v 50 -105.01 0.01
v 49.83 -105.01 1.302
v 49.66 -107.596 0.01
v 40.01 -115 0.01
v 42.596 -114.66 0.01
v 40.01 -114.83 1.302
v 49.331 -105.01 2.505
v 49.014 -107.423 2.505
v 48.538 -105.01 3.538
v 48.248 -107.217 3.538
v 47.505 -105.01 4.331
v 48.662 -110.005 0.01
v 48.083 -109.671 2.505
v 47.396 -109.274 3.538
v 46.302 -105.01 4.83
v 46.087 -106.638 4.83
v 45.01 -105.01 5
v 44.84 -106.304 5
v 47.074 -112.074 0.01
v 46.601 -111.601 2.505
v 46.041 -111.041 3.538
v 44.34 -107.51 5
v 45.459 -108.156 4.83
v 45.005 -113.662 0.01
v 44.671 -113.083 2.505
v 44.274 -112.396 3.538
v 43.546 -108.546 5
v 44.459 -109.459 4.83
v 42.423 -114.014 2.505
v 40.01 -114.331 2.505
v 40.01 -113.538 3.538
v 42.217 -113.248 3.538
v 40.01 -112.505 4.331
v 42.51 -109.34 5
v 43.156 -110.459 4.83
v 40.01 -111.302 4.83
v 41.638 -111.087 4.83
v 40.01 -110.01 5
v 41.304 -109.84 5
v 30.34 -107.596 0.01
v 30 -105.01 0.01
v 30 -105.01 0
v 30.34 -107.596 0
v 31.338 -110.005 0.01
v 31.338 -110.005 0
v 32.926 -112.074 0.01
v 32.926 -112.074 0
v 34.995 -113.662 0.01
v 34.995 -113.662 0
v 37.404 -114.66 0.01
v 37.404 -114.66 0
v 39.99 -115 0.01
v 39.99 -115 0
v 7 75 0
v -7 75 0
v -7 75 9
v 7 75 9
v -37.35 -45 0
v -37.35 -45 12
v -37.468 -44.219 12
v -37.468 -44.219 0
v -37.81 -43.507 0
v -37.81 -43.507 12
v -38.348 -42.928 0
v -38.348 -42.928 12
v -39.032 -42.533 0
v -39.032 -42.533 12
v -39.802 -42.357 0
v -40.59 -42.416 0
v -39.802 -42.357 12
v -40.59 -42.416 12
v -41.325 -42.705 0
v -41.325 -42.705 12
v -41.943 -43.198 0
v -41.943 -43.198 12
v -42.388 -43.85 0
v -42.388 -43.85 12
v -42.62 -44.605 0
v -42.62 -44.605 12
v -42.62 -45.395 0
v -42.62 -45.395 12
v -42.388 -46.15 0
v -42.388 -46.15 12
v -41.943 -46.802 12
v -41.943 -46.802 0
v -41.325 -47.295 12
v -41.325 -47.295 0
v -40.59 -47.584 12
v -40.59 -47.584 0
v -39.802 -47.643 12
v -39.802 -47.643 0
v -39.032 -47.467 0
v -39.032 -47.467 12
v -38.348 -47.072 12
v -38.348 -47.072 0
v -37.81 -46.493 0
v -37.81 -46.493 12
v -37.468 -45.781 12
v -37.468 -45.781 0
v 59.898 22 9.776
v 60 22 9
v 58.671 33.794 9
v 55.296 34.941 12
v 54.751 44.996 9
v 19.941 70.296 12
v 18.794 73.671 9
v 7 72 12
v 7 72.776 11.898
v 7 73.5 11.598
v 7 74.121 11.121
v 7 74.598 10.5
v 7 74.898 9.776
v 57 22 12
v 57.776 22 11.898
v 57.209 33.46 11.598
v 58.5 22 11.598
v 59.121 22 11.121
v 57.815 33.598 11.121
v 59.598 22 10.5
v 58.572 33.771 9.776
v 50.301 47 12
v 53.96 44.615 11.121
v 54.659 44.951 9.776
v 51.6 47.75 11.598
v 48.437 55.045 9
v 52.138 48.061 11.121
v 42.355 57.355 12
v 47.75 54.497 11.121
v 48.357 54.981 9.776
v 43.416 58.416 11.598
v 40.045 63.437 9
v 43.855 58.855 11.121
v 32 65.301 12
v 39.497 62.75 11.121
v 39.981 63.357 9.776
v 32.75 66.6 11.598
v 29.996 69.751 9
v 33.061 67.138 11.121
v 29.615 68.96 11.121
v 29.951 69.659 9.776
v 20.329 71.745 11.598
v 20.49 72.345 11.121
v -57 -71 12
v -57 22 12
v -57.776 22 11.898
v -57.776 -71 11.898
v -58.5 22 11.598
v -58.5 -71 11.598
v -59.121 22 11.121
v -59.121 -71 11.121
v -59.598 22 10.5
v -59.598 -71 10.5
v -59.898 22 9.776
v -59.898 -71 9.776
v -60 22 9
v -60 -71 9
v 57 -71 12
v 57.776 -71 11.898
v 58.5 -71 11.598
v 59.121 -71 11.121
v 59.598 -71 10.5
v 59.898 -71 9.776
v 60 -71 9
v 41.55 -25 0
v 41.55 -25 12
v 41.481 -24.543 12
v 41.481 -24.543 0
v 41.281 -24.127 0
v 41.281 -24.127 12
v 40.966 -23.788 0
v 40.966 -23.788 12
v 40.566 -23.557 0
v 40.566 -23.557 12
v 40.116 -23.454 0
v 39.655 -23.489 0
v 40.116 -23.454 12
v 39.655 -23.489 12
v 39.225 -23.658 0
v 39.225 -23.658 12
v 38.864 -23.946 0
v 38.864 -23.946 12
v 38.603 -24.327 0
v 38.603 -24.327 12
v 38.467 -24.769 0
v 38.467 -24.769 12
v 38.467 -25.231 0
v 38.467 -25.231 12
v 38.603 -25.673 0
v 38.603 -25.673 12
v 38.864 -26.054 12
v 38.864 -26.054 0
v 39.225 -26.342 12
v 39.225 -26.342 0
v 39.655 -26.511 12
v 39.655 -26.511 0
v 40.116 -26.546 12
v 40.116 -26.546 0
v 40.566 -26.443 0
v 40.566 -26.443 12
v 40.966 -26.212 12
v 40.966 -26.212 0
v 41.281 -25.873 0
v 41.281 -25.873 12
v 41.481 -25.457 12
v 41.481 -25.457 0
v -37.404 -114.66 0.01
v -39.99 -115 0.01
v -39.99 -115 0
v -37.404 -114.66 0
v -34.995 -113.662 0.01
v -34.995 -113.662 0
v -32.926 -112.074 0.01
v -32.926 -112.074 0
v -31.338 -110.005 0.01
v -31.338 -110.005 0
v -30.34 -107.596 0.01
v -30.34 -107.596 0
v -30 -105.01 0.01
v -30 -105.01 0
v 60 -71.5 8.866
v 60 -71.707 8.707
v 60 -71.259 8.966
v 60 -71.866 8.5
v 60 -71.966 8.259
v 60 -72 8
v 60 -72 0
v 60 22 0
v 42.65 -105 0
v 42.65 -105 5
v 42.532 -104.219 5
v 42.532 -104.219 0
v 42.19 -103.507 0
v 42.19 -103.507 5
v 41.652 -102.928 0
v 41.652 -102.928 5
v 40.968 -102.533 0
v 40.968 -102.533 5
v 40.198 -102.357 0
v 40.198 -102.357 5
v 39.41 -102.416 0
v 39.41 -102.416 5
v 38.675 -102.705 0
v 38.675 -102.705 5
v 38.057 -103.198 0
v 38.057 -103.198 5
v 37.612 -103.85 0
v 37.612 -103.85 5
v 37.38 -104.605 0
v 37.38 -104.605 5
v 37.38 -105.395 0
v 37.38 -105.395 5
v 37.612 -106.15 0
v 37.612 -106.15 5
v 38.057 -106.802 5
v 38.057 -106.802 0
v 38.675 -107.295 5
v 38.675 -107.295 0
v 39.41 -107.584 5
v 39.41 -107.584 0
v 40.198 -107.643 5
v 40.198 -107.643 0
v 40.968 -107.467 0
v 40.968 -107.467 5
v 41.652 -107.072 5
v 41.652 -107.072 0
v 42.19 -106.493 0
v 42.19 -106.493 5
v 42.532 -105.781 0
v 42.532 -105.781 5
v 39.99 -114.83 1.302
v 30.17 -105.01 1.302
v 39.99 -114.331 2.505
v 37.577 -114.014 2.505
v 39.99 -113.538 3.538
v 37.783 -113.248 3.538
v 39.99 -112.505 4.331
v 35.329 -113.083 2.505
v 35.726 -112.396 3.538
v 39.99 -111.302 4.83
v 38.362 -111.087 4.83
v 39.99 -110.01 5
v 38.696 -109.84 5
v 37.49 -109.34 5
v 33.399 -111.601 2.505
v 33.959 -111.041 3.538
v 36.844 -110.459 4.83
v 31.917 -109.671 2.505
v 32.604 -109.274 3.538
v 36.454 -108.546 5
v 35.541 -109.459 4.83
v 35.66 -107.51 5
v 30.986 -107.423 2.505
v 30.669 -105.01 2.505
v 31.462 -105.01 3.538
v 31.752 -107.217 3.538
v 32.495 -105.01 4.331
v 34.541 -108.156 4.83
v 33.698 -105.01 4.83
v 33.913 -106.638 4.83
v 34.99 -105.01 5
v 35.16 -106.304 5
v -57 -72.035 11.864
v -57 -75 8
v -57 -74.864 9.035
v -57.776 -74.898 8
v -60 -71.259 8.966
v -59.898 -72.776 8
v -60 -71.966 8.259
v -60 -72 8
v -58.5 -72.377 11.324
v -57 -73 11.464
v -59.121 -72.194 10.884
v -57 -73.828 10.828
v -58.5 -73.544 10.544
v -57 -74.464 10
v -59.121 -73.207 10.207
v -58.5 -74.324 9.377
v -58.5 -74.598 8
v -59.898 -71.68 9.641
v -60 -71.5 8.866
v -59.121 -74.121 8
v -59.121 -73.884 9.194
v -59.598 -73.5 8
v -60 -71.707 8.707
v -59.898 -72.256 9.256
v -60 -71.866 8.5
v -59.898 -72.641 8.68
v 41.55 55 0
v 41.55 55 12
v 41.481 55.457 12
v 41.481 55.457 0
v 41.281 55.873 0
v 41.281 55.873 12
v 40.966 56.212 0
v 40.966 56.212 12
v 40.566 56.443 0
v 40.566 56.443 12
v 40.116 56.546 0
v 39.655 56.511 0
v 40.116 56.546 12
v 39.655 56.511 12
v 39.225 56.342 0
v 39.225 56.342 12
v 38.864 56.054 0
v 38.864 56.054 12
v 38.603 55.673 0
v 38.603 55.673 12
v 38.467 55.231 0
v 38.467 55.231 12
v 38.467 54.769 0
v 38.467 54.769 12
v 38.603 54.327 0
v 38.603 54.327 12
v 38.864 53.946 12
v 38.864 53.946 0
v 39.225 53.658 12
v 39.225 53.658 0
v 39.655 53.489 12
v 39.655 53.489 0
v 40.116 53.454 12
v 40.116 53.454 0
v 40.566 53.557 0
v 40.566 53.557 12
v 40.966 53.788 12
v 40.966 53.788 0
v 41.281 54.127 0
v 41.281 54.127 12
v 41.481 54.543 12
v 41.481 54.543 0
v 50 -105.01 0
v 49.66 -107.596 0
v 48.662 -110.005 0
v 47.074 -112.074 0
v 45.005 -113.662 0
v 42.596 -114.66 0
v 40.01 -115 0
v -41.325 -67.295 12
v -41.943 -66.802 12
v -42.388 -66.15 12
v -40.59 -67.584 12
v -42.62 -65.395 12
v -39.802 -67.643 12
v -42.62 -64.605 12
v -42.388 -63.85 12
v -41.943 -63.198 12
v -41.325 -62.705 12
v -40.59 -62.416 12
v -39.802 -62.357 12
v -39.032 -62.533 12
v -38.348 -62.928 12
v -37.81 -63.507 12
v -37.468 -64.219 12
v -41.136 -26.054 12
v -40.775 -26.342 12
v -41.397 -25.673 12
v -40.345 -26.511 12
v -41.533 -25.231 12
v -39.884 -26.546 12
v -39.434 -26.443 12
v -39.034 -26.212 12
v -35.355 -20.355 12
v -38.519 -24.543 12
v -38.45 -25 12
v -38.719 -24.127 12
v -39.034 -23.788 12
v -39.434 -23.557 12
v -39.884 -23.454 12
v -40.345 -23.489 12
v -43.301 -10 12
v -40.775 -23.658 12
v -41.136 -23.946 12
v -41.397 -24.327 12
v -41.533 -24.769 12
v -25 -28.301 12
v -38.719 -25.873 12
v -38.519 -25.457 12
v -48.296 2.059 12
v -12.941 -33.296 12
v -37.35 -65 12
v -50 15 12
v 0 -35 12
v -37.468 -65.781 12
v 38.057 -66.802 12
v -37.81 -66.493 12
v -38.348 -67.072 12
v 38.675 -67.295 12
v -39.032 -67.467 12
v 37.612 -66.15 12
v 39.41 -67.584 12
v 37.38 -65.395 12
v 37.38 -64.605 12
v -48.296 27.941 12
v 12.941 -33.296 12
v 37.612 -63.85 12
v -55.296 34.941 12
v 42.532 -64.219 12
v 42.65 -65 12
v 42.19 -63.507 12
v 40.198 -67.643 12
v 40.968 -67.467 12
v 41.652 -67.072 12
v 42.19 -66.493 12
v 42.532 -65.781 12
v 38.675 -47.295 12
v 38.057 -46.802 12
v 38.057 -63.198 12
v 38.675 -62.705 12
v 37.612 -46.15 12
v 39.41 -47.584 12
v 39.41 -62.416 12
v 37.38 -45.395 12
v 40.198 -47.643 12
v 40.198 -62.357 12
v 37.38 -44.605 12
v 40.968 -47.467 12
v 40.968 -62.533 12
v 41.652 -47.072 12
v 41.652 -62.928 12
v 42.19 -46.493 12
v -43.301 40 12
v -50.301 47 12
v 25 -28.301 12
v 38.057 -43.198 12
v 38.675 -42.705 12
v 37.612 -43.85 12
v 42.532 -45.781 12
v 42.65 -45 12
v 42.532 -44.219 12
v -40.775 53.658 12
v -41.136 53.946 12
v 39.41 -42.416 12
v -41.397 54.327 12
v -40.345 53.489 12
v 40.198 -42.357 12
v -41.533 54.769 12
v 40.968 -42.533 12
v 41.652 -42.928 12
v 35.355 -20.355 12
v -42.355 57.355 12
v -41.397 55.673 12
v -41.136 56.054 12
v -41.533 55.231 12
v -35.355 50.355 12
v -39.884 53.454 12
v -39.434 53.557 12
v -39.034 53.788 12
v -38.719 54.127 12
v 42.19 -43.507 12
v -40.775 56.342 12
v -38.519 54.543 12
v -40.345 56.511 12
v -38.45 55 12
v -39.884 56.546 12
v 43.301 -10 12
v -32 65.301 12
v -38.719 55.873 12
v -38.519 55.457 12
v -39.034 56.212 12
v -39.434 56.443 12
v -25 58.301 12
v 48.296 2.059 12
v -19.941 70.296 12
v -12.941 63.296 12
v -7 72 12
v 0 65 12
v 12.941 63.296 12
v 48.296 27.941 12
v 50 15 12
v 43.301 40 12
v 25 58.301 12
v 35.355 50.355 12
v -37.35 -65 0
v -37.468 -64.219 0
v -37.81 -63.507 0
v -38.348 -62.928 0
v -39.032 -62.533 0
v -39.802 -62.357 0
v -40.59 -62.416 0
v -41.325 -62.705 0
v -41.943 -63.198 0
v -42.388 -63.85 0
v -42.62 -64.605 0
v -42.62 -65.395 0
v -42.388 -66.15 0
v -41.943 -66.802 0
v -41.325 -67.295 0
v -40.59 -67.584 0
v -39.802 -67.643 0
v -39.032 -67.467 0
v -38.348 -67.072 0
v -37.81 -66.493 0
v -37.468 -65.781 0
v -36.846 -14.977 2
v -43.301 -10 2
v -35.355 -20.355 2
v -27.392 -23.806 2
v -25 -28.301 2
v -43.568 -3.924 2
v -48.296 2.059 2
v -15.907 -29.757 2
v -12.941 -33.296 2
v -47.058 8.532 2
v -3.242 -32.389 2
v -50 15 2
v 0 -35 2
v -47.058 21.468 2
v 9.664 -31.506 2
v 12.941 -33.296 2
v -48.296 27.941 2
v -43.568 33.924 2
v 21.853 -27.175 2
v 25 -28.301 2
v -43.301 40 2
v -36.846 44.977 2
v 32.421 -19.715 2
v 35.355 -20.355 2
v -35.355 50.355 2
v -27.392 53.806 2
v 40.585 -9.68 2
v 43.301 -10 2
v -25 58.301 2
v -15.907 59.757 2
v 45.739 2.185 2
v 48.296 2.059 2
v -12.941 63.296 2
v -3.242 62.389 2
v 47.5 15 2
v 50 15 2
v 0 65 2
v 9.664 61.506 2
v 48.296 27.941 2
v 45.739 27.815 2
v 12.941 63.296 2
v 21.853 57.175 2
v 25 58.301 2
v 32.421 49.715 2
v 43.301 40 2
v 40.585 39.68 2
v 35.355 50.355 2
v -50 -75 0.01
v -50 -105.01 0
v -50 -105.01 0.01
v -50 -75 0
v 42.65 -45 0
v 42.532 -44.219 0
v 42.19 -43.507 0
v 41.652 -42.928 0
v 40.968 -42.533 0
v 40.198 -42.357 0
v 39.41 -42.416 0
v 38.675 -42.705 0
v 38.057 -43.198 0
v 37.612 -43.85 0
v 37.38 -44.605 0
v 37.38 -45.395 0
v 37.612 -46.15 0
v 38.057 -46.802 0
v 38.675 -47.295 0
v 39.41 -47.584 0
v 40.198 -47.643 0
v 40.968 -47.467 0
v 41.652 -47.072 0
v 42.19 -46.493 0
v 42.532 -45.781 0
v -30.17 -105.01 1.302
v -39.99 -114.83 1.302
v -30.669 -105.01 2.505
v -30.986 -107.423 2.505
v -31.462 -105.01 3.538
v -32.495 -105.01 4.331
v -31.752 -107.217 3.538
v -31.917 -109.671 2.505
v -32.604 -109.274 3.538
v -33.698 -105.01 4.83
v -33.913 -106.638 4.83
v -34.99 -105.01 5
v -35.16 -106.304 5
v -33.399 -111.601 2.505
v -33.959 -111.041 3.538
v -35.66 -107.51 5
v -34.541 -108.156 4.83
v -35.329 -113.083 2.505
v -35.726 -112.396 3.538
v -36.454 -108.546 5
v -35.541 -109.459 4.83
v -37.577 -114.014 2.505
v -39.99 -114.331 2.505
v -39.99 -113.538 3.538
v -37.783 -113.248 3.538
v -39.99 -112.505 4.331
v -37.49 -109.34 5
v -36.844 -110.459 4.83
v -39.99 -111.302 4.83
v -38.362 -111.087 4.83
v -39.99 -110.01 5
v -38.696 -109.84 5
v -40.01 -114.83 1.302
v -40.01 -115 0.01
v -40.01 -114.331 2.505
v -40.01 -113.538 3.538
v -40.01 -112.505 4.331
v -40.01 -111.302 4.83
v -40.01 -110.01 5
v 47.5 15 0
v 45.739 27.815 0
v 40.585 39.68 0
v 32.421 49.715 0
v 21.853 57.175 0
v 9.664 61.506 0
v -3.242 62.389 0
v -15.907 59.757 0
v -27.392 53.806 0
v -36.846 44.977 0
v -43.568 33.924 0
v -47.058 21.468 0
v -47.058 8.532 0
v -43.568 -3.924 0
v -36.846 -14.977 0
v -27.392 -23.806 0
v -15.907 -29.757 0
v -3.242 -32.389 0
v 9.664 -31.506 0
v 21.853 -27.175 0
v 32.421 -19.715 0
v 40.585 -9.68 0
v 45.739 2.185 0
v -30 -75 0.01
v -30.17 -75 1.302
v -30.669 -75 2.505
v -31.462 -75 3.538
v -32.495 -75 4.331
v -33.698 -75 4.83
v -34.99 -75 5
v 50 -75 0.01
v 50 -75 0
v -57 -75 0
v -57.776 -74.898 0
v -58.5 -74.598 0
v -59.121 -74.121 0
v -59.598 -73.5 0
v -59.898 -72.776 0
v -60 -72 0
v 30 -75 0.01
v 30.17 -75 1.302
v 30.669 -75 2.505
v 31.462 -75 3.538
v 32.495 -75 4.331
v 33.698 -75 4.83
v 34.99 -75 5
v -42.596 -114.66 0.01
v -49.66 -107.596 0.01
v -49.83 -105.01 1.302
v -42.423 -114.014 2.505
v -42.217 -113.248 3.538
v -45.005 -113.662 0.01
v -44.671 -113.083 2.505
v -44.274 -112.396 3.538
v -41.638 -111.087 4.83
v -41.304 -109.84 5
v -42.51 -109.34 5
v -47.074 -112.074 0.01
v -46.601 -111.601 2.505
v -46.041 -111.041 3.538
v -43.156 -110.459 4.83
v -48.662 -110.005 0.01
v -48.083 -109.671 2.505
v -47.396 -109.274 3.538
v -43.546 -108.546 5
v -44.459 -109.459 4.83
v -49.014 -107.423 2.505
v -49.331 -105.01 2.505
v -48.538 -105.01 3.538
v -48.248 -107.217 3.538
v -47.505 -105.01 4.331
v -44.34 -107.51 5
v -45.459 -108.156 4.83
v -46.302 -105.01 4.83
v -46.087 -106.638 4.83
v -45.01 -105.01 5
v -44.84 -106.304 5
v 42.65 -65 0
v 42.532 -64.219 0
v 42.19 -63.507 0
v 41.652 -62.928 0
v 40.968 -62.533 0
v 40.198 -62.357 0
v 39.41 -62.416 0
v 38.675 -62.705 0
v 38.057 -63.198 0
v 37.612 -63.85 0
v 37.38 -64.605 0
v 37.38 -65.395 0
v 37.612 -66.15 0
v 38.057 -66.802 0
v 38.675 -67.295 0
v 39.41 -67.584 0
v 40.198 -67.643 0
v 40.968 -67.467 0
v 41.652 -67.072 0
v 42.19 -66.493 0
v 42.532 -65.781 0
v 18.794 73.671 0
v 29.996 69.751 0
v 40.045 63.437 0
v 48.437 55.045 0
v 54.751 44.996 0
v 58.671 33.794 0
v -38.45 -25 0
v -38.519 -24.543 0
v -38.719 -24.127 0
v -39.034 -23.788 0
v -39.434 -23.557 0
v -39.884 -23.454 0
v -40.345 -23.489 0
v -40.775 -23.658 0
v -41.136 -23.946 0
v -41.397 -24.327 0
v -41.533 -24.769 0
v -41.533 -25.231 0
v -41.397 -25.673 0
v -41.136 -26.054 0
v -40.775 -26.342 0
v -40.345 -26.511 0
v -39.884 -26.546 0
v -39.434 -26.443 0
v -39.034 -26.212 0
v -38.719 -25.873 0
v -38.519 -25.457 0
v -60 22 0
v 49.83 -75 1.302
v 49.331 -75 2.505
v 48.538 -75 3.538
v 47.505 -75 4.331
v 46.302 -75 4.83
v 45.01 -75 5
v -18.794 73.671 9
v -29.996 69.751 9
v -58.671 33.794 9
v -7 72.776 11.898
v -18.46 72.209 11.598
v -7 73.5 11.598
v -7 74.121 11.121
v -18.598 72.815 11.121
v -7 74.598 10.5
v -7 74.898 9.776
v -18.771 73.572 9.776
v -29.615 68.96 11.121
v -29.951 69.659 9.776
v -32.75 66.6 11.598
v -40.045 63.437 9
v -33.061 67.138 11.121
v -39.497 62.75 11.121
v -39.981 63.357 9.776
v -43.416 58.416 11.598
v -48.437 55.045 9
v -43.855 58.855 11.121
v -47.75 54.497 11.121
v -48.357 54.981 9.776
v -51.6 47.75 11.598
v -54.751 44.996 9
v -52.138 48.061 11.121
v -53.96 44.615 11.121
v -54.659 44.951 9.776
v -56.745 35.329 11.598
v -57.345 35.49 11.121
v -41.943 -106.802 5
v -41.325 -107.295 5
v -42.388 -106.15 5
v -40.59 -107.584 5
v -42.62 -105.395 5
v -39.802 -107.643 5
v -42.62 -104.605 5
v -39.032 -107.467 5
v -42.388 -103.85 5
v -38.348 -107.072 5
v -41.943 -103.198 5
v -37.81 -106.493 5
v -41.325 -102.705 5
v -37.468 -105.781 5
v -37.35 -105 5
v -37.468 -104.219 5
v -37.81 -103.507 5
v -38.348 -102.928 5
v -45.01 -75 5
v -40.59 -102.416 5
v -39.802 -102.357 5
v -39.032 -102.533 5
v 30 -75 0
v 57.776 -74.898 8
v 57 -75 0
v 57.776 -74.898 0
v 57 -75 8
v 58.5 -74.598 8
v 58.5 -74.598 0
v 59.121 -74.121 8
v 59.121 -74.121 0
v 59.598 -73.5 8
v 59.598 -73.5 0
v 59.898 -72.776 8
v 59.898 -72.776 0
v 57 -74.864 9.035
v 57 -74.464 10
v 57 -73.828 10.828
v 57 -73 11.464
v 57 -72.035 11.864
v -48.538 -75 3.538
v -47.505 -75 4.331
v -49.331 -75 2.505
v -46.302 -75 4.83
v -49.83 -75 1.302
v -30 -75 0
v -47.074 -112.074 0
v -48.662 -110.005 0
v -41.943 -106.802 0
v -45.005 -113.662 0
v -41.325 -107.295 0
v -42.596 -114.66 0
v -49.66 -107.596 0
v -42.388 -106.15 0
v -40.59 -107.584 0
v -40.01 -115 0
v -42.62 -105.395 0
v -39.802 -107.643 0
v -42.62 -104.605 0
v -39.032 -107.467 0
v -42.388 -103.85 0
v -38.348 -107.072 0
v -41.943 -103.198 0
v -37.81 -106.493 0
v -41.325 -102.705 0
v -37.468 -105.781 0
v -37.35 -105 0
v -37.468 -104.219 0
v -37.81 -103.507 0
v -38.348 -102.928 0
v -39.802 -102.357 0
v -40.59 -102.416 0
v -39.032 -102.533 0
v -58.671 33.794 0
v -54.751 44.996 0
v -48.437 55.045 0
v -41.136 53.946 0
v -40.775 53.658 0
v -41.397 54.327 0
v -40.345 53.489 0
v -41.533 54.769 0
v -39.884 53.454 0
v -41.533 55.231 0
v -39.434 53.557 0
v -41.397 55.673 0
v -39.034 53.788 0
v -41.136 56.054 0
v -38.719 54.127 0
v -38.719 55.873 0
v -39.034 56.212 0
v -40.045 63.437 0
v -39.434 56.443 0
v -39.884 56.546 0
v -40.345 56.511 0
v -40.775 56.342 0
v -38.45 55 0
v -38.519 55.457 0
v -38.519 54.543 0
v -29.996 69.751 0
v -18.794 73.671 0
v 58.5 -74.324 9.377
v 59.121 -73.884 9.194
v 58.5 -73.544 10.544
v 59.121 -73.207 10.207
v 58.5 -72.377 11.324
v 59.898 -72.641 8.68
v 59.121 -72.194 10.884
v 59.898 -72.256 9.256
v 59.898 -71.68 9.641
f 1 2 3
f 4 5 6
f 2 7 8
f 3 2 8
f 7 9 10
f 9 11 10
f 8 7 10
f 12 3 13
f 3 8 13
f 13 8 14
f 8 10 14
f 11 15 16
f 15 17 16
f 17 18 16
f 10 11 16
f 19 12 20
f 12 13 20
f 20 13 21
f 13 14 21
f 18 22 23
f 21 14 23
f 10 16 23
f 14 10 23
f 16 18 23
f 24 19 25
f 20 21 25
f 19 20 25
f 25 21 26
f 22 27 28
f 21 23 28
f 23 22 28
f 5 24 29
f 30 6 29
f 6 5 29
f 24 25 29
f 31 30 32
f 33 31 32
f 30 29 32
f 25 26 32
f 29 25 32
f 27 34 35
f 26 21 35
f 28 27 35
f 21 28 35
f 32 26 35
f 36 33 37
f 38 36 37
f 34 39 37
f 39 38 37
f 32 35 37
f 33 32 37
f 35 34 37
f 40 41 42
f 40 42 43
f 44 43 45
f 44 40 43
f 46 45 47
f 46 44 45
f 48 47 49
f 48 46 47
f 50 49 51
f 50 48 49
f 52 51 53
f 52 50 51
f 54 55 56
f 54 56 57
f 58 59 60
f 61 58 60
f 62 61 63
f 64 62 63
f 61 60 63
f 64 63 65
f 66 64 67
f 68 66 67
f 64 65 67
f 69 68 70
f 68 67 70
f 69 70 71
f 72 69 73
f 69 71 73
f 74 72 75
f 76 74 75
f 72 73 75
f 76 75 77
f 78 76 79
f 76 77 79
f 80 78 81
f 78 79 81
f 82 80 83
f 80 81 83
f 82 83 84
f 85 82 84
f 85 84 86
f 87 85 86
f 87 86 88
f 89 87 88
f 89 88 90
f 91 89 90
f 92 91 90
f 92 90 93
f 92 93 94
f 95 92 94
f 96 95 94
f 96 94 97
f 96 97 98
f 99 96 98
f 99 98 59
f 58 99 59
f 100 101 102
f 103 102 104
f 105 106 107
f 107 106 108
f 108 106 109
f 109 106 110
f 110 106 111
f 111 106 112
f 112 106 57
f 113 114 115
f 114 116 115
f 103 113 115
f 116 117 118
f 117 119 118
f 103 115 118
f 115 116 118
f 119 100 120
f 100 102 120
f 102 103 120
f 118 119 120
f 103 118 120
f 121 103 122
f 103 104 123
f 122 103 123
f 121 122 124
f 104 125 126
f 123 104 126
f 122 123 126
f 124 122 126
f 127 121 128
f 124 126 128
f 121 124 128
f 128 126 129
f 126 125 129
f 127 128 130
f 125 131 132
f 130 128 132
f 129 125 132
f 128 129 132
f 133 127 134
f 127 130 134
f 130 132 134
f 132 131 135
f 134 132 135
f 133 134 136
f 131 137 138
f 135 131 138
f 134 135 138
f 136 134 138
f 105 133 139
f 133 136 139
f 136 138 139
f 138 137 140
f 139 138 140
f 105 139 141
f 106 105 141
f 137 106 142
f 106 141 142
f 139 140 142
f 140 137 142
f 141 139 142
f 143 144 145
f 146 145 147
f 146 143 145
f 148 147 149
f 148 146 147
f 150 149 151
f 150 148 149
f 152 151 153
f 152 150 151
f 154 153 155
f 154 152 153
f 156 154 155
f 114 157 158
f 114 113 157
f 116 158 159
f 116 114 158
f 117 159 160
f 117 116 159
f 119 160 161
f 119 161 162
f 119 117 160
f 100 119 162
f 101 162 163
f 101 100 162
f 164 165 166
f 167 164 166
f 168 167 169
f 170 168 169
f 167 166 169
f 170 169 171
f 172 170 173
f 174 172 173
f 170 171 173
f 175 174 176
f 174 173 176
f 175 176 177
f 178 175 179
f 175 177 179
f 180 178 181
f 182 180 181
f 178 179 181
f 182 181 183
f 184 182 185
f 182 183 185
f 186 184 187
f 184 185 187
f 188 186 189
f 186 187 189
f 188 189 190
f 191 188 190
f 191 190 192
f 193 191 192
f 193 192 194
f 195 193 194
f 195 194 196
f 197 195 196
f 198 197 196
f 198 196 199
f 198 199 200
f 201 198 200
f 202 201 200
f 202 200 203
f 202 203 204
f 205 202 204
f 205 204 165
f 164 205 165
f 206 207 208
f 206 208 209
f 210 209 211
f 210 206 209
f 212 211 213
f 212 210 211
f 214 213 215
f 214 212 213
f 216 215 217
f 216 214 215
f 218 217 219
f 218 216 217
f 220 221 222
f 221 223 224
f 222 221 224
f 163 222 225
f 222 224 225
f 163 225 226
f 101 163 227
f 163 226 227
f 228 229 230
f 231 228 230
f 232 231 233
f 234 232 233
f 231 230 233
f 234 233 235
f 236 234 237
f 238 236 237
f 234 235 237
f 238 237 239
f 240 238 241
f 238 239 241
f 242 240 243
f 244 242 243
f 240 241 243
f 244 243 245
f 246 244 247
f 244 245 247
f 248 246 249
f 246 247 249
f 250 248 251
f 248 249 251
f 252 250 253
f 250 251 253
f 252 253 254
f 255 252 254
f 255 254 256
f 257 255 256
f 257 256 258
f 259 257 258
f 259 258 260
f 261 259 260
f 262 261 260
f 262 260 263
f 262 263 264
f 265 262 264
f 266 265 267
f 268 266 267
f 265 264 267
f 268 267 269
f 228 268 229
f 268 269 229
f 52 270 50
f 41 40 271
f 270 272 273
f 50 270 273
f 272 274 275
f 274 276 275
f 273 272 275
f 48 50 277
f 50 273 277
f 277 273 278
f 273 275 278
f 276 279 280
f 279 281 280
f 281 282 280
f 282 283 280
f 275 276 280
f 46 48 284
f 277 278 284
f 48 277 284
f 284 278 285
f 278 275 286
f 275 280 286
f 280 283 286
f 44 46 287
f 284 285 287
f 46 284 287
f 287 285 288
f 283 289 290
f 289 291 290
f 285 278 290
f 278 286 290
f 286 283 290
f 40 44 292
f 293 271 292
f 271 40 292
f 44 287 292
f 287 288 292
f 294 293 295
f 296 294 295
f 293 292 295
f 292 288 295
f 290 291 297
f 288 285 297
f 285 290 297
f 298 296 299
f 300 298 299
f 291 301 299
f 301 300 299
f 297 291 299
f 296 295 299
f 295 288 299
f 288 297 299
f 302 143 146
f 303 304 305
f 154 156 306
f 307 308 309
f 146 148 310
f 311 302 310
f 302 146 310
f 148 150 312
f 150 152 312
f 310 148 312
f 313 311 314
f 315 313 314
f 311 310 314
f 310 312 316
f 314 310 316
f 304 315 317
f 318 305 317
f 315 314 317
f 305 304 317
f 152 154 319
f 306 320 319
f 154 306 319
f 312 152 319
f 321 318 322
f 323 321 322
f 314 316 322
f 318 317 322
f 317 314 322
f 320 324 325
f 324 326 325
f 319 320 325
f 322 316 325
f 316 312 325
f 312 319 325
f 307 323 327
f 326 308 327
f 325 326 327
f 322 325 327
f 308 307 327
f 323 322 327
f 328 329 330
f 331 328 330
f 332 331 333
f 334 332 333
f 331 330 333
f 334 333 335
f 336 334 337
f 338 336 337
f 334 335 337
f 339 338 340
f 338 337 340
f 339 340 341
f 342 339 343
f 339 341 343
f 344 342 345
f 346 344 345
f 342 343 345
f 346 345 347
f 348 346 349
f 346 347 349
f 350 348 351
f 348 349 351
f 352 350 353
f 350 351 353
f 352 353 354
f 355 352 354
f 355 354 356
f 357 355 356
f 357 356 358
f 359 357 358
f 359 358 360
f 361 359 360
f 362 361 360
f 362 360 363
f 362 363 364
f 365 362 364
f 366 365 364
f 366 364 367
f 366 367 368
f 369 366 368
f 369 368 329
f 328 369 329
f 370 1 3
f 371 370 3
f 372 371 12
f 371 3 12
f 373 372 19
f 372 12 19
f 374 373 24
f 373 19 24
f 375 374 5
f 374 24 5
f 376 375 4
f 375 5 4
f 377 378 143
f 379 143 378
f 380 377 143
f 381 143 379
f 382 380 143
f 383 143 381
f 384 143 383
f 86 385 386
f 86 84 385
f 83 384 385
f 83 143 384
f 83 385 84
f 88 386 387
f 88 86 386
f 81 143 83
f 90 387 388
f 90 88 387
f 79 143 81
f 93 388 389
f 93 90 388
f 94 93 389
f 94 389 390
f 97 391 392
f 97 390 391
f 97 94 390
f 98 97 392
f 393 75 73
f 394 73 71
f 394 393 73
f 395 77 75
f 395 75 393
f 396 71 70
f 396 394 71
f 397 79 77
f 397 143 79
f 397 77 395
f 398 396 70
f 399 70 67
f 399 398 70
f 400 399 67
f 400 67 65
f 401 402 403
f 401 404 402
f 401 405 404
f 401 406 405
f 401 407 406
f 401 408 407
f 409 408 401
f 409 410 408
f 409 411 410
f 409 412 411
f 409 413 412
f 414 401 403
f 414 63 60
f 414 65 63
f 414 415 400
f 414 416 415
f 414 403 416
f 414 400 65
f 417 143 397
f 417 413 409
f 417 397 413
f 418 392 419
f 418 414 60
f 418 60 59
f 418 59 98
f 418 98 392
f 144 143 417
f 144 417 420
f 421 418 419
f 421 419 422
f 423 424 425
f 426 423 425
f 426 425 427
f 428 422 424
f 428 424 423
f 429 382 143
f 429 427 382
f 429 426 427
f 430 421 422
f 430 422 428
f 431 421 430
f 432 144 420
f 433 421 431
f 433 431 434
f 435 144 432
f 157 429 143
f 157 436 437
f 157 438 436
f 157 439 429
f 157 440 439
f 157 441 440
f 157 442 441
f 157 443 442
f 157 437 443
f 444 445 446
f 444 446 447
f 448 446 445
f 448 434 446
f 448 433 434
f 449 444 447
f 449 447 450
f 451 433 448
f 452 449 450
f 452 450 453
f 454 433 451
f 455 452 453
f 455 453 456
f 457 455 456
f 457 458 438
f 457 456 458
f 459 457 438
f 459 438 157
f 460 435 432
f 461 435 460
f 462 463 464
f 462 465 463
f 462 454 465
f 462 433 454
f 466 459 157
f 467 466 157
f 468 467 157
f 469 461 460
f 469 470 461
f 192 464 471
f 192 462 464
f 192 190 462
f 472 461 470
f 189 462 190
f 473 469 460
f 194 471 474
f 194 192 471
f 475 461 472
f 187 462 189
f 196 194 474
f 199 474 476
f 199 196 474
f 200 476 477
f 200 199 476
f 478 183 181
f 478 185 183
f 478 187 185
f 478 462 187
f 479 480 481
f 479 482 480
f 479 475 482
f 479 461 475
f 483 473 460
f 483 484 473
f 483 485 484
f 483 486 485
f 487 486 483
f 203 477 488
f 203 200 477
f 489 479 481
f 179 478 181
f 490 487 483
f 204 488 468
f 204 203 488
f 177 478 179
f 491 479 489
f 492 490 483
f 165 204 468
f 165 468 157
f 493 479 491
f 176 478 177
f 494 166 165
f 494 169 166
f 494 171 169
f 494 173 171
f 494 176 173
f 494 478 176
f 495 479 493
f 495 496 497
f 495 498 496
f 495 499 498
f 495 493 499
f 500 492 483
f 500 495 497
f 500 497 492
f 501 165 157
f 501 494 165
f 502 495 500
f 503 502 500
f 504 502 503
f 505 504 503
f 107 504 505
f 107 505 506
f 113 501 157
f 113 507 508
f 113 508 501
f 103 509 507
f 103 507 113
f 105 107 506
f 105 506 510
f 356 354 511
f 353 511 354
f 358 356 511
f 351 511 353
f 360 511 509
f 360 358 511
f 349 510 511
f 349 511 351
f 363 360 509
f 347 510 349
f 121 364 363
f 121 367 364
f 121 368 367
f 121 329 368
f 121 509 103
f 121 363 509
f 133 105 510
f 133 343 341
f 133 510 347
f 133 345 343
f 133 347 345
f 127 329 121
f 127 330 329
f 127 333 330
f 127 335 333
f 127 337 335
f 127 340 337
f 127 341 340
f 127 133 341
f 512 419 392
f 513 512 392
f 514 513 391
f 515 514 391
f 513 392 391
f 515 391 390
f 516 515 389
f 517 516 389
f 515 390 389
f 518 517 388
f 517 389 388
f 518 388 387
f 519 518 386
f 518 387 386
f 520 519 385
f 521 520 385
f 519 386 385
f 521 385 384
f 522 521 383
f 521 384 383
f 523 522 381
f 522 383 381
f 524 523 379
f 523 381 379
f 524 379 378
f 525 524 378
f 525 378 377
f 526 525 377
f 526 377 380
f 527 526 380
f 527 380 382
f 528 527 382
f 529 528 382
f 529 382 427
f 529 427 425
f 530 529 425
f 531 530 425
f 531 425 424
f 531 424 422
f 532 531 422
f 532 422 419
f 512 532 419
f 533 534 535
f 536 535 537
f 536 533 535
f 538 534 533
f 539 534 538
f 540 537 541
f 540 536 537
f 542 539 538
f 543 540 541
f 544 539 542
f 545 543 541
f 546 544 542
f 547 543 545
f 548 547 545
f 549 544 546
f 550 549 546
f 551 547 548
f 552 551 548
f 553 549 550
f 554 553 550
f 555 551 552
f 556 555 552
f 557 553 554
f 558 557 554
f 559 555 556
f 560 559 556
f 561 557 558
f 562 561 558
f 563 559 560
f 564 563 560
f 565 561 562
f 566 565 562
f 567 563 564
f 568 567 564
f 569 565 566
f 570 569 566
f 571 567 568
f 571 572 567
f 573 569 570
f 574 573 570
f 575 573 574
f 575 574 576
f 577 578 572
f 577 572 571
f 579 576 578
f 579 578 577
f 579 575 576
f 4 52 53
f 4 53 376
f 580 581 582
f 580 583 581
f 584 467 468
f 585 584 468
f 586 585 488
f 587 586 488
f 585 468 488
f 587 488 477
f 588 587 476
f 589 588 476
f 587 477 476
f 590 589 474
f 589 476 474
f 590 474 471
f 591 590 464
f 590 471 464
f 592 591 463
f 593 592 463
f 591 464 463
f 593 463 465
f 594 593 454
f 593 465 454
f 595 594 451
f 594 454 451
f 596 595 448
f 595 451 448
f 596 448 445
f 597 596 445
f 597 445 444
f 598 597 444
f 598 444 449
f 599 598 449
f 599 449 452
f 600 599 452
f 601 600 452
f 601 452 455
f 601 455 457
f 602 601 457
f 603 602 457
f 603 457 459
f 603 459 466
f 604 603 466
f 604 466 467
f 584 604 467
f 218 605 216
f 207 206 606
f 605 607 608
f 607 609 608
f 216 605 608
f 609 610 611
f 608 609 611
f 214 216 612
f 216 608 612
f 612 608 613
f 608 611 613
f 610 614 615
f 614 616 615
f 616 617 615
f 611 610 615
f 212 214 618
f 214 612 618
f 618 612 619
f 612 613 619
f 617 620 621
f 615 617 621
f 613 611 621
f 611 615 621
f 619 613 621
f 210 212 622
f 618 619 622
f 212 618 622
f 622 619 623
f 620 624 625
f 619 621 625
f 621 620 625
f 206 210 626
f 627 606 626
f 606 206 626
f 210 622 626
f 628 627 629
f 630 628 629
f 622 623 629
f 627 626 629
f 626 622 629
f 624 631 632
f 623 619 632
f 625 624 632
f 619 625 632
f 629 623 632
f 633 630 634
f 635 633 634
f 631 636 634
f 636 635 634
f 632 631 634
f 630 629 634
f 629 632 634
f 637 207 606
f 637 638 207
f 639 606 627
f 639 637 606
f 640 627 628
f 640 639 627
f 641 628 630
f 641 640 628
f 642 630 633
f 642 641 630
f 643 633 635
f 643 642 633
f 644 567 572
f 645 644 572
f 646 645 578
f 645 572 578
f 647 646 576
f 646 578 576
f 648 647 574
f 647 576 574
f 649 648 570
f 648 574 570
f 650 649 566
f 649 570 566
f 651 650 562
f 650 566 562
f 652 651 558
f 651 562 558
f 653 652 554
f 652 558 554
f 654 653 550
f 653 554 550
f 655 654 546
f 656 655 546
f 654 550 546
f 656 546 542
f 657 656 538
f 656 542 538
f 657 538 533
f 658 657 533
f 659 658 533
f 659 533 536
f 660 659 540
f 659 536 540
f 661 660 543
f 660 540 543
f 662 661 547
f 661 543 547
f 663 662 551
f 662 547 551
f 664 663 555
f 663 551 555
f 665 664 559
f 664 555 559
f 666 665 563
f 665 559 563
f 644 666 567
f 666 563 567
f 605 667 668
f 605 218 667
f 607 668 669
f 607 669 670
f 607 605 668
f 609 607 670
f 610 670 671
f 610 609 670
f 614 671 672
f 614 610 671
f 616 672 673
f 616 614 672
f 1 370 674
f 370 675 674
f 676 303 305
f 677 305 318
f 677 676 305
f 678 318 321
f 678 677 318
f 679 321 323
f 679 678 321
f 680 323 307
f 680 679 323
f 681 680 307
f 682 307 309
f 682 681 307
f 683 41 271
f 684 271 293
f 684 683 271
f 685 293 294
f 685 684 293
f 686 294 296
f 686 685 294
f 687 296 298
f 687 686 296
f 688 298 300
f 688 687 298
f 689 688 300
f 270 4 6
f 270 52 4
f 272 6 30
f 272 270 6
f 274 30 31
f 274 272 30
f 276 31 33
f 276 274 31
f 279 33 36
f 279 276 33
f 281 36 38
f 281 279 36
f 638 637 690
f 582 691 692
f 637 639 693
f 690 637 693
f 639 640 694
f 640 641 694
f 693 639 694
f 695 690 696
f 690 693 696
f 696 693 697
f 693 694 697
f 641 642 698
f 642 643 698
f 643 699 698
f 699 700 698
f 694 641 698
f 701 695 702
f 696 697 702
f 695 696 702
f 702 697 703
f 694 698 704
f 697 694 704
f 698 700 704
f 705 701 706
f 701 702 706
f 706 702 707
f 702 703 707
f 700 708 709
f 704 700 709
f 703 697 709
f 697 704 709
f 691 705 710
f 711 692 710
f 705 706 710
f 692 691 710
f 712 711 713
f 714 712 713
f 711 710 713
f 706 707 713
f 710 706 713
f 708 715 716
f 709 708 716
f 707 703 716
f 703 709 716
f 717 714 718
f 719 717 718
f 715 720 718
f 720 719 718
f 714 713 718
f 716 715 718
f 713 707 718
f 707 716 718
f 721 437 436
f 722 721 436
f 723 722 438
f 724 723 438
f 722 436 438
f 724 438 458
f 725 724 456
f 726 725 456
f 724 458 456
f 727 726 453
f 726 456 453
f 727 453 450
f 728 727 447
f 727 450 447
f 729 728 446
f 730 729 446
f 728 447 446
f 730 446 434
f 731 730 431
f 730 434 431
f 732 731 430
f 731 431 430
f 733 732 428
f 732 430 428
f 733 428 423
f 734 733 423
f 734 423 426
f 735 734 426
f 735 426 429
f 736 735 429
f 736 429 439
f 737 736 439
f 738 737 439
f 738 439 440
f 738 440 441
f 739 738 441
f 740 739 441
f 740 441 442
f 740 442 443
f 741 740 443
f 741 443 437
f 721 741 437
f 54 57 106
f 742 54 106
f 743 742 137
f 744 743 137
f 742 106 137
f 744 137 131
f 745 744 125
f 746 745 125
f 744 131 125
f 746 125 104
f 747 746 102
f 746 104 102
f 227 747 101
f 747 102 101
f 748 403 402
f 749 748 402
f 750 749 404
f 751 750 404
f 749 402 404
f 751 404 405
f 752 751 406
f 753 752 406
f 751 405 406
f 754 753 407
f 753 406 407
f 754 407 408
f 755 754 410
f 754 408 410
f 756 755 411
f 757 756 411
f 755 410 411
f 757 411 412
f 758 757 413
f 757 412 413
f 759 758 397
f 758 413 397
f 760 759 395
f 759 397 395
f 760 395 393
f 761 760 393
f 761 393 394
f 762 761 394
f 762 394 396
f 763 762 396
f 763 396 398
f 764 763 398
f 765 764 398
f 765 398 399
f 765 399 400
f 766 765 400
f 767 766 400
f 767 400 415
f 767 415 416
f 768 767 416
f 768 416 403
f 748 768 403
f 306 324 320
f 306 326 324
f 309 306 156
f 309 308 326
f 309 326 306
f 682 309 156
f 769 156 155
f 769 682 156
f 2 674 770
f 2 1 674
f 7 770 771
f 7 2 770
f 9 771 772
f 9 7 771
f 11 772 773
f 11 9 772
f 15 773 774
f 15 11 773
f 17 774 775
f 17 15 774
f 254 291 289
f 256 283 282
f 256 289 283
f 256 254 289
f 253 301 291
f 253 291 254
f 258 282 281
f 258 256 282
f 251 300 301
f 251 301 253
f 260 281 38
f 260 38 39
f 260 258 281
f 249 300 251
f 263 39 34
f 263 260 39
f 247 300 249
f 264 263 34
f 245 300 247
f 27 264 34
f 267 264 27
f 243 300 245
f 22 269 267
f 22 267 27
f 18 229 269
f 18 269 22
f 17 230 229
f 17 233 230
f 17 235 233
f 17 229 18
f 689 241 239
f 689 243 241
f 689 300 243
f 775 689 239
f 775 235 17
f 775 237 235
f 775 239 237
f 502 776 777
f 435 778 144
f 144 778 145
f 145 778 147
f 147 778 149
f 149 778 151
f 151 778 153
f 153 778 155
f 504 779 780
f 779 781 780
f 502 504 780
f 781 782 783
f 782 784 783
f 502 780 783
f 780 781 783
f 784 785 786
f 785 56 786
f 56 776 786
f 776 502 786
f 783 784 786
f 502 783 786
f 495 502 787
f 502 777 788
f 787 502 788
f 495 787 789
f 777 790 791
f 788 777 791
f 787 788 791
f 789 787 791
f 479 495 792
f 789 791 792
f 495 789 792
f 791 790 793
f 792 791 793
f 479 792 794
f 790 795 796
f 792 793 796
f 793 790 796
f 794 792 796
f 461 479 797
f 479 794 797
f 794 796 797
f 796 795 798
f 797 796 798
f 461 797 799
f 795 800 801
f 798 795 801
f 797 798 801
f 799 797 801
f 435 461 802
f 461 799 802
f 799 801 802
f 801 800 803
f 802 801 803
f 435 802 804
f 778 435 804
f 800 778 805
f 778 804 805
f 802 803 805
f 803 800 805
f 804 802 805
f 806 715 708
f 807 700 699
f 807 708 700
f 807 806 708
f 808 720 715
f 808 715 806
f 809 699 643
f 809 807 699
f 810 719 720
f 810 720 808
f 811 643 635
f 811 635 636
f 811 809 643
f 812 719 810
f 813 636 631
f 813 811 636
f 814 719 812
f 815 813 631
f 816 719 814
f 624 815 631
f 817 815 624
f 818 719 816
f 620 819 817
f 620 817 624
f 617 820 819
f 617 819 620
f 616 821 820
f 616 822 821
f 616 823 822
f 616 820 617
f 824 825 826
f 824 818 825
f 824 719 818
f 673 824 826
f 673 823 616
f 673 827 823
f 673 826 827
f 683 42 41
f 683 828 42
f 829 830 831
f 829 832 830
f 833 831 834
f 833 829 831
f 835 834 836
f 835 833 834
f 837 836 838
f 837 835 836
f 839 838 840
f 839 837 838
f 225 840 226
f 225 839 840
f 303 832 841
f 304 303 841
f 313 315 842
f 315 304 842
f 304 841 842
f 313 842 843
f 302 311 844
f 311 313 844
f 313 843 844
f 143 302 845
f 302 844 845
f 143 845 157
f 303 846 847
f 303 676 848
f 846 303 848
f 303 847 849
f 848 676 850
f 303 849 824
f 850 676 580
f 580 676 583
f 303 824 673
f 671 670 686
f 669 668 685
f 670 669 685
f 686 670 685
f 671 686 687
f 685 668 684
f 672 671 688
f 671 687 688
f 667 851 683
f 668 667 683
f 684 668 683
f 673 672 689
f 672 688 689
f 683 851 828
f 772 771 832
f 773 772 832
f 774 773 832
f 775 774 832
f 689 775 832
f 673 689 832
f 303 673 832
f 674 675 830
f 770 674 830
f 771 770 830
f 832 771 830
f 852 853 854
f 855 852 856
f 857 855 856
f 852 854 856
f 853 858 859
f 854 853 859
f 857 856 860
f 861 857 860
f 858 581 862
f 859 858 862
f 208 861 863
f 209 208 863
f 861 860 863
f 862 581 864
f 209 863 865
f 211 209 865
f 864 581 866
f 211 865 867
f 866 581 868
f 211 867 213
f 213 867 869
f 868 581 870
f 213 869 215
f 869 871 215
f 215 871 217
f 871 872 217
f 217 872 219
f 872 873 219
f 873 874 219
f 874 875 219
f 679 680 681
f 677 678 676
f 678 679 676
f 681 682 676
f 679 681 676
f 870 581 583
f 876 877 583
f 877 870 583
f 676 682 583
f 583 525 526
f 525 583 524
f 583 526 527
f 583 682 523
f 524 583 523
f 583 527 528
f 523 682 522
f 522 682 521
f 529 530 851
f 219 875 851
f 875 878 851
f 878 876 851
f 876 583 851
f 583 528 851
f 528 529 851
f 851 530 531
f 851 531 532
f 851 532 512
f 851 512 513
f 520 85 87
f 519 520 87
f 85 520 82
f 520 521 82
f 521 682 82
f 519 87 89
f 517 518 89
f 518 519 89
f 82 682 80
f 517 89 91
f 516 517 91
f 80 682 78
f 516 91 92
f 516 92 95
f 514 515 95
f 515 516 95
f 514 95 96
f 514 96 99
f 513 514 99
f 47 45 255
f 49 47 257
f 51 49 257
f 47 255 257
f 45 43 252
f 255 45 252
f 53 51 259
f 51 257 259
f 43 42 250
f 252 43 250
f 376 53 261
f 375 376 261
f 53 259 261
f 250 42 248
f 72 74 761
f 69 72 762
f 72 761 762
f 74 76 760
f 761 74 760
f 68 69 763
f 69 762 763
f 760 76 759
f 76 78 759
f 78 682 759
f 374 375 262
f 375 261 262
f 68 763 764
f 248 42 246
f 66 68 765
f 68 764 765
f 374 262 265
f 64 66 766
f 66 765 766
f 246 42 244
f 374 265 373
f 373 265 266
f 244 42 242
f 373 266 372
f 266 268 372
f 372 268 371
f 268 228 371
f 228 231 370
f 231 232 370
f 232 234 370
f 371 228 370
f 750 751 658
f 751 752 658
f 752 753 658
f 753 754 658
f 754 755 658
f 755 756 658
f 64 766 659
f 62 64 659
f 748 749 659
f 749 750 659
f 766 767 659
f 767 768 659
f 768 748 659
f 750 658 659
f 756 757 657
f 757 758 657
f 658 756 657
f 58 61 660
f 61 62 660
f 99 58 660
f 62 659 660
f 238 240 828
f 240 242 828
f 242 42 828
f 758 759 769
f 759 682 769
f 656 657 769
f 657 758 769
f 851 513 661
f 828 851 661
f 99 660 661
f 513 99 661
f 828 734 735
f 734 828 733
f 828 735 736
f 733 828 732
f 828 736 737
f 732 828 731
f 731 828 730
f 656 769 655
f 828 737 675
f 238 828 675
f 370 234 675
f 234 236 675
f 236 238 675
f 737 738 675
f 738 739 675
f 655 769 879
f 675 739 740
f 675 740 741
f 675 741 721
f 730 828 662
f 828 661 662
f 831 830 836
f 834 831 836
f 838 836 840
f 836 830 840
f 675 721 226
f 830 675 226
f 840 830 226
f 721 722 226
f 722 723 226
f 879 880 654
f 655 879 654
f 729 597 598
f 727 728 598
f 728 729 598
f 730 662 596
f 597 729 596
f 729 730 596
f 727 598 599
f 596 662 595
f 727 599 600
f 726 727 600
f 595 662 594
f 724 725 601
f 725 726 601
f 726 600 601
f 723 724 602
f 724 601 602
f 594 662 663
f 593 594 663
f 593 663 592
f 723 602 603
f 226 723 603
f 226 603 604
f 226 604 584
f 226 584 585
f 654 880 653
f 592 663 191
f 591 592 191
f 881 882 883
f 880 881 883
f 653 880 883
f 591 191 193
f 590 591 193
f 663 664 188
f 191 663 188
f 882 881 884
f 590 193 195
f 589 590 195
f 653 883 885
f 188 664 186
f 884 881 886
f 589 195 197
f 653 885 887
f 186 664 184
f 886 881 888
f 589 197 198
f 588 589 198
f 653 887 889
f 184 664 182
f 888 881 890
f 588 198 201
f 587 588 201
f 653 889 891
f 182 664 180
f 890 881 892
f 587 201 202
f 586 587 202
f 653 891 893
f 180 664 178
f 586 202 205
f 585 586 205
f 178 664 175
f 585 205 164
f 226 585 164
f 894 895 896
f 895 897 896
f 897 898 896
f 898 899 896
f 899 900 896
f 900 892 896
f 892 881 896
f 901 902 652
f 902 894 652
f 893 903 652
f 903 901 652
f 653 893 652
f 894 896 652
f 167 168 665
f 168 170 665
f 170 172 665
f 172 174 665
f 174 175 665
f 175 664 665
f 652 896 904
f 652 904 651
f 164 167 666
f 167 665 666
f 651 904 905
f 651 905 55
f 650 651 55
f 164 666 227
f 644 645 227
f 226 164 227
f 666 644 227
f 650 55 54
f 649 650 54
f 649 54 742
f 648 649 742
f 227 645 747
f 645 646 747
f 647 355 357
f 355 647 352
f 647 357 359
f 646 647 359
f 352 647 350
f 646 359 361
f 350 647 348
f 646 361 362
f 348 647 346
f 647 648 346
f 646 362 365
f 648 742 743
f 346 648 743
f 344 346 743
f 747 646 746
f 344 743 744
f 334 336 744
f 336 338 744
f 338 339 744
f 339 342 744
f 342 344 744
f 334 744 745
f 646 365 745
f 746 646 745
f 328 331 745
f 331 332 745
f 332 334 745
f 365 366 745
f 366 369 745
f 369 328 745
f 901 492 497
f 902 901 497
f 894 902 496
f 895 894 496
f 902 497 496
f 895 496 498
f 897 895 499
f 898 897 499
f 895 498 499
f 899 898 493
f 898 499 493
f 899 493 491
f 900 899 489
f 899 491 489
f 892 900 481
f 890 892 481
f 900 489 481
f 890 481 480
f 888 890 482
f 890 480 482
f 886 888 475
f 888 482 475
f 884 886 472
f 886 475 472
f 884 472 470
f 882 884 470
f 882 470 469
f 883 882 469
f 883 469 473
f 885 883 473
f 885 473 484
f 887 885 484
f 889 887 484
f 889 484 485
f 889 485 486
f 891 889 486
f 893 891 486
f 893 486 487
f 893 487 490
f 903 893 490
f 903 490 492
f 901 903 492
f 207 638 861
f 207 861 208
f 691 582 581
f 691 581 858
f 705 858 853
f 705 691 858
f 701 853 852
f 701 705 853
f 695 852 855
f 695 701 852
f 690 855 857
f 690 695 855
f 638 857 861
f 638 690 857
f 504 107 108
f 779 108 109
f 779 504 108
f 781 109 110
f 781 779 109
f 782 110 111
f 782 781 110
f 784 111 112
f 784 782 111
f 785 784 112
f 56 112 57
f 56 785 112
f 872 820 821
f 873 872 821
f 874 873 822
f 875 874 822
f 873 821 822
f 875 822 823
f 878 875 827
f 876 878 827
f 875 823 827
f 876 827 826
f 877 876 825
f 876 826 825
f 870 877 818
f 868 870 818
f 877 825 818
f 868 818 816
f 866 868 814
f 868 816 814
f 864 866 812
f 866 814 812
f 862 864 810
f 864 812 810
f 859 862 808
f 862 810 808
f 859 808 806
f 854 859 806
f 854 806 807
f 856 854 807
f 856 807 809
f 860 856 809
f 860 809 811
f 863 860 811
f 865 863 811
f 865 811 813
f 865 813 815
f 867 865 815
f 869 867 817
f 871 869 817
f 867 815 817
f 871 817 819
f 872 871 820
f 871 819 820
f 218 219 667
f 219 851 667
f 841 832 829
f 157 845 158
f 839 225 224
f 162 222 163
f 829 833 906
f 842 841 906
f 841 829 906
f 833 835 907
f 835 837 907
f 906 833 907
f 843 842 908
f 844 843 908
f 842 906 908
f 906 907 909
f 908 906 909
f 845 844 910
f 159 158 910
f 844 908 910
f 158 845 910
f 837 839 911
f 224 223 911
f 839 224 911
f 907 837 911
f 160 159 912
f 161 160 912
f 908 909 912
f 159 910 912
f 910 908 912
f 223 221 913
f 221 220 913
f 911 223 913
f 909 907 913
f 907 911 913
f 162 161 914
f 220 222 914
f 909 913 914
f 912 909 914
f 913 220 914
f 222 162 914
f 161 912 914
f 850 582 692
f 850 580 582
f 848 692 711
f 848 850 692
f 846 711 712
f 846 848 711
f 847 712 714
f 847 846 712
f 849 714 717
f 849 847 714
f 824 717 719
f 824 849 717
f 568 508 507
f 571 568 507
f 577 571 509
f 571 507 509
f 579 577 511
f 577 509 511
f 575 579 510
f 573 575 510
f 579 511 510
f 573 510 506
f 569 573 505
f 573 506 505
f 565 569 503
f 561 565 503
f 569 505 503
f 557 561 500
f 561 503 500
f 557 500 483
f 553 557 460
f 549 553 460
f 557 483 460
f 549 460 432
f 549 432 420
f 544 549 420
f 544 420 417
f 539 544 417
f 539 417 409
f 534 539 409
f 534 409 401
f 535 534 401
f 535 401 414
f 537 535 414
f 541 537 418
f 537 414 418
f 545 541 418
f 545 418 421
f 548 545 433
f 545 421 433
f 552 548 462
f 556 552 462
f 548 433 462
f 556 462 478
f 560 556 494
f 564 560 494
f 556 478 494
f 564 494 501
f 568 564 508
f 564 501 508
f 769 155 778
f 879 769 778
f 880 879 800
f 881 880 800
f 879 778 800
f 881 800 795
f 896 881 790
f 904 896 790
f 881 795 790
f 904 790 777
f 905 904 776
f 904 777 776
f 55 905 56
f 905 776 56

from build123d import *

# Parameters (mm, degrees)
SKETCH_W        = 120
SKETCH_H        = 150
PAD_DEPTH       = 12
SKETCH001_R     = 50
POCKET_DEPTH    = 10
SKETCH002_R     = 47.5
POCKET001_DEPTH = 2
SKETCH003_R     = 2.65
POCKET002_DEPTH = 15
SKETCH004_R     = 1.55
POCKET003_DEPTH = 15
SKETCH005_W     = 20
SKETCH005_H     = 5
PAD001_DEPTH    = 40
SKETCH006_R     = 2.65
POCKET004_DEPTH = 5
FILLET_R        = 53
FILLET001_R     = 4
FILLET002_R     = 3
FILLET003_R     = 9.99
FILLET004_R     = 4.99


with BuildPart() as part:
    # Sketch → Pad (new body)
    with BuildSketch(Plane.XY):
        Rectangle(SKETCH_W, SKETCH_H)
    extrude(amount=PAD_DEPTH)

    # Sketch001 (on Face6 of Pad) → Pocket (cut)
    with BuildSketch(Plane.XY.offset(12)):
        with Locations((0, 15)):
            Circle(SKETCH001_R)
    extrude(amount=-POCKET_DEPTH, mode=Mode.SUBTRACT)

    # Sketch002 (on Face8 of Pocket) → Pocket001 (cut)
    with BuildSketch(Plane.XY.offset(2)):
        with Locations((0, 15)):
            Circle(SKETCH002_R)
    extrude(amount=-POCKET001_DEPTH, mode=Mode.SUBTRACT)

    # Sketch003 (on Face5 of Pocket001) → Pocket002 (cut)
    with BuildSketch(Plane.XY.offset(12)):
        with Locations((-40, -45)):
            Circle(SKETCH003_R)
        with Locations((-40, -65)):
            Circle(SKETCH003_R)
        with Locations((40, -45)):
            Circle(SKETCH003_R)
        with Locations((40, -65)):
            Circle(SKETCH003_R)
    extrude(amount=-POCKET002_DEPTH, mode=Mode.SUBTRACT)

    # Sketch004 (on Face5 of Pocket002) → Pocket003 (cut)
    with BuildSketch(Plane.XY.offset(12)):
        with Locations((-40, 55)):
            Circle(SKETCH004_R)
        with Locations((40, 55)):
            Circle(SKETCH004_R)
        with Locations((40, -25)):
            Circle(SKETCH004_R)
        with Locations((-40, -25)):
            Circle(SKETCH004_R)
    extrude(amount=-POCKET003_DEPTH, mode=Mode.SUBTRACT)

    # Sketch005 (on Face2 of Pocket003) → Pad001 (join)
    with BuildSketch(Plane.XZ.offset(75)):
        with Locations((-40, 2.5)):
            Rectangle(SKETCH005_W, SKETCH005_H)
        with Locations((40, 2.5)):
            Rectangle(SKETCH005_W, SKETCH005_H)
    extrude(amount=PAD001_DEPTH)

    # Sketch006 (on Face10 of Pad001) → Pocket004 (cut)
    with BuildSketch(Plane.XY.offset(5)):
        with Locations((-40, -105)):
            Circle(SKETCH006_R)
        with Locations((40, -105)):
            Circle(SKETCH006_R)
    extrude(amount=-POCKET004_DEPTH, mode=Mode.SUBTRACT)

    # Fillet
    fillet_edges = [part.edges().sort_by_distance(p)[0] for p in [
        (60, 75, 6),
        (-60, 75, 6),
    ]]
    fillet(fillet_edges, radius=FILLET_R)

    # Fillet001
    fillet001_edges = [part.edges().sort_by_distance(p)[0] for p in [
        (0, -75, 12),
    ]]
    fillet(fillet001_edges, radius=FILLET001_R)

    # Fillet002
    fillet002_edges = [part.edges().sort_by_distance(p)[0] for p in [
        (60, -24.5, 12),
        (-60, -24.5, 12),
    ]]
    fillet(fillet002_edges, radius=FILLET002_R)

    # Fillet003
    fillet003_edges = [part.edges().sort_by_distance(p)[0] for p in [
        (-30, -115, 2.5),
        (-50, -115, 2.5),
        (30, -115, 2.5),
        (50, -115, 2.5),
    ]]
    fillet(fillet003_edges, radius=FILLET003_R)

    # Fillet004
    fillet004_edges = [part.edges().sort_by_distance(p)[0] for p in [
        (50, -90.005, 5),
        (30, -90.005, 5),
        (-30, -90.005, 5),
        (-50, -90.005, 5),
    ]]
    fillet(fillet004_edges, radius=FILLET004_R)


solid = part.part
